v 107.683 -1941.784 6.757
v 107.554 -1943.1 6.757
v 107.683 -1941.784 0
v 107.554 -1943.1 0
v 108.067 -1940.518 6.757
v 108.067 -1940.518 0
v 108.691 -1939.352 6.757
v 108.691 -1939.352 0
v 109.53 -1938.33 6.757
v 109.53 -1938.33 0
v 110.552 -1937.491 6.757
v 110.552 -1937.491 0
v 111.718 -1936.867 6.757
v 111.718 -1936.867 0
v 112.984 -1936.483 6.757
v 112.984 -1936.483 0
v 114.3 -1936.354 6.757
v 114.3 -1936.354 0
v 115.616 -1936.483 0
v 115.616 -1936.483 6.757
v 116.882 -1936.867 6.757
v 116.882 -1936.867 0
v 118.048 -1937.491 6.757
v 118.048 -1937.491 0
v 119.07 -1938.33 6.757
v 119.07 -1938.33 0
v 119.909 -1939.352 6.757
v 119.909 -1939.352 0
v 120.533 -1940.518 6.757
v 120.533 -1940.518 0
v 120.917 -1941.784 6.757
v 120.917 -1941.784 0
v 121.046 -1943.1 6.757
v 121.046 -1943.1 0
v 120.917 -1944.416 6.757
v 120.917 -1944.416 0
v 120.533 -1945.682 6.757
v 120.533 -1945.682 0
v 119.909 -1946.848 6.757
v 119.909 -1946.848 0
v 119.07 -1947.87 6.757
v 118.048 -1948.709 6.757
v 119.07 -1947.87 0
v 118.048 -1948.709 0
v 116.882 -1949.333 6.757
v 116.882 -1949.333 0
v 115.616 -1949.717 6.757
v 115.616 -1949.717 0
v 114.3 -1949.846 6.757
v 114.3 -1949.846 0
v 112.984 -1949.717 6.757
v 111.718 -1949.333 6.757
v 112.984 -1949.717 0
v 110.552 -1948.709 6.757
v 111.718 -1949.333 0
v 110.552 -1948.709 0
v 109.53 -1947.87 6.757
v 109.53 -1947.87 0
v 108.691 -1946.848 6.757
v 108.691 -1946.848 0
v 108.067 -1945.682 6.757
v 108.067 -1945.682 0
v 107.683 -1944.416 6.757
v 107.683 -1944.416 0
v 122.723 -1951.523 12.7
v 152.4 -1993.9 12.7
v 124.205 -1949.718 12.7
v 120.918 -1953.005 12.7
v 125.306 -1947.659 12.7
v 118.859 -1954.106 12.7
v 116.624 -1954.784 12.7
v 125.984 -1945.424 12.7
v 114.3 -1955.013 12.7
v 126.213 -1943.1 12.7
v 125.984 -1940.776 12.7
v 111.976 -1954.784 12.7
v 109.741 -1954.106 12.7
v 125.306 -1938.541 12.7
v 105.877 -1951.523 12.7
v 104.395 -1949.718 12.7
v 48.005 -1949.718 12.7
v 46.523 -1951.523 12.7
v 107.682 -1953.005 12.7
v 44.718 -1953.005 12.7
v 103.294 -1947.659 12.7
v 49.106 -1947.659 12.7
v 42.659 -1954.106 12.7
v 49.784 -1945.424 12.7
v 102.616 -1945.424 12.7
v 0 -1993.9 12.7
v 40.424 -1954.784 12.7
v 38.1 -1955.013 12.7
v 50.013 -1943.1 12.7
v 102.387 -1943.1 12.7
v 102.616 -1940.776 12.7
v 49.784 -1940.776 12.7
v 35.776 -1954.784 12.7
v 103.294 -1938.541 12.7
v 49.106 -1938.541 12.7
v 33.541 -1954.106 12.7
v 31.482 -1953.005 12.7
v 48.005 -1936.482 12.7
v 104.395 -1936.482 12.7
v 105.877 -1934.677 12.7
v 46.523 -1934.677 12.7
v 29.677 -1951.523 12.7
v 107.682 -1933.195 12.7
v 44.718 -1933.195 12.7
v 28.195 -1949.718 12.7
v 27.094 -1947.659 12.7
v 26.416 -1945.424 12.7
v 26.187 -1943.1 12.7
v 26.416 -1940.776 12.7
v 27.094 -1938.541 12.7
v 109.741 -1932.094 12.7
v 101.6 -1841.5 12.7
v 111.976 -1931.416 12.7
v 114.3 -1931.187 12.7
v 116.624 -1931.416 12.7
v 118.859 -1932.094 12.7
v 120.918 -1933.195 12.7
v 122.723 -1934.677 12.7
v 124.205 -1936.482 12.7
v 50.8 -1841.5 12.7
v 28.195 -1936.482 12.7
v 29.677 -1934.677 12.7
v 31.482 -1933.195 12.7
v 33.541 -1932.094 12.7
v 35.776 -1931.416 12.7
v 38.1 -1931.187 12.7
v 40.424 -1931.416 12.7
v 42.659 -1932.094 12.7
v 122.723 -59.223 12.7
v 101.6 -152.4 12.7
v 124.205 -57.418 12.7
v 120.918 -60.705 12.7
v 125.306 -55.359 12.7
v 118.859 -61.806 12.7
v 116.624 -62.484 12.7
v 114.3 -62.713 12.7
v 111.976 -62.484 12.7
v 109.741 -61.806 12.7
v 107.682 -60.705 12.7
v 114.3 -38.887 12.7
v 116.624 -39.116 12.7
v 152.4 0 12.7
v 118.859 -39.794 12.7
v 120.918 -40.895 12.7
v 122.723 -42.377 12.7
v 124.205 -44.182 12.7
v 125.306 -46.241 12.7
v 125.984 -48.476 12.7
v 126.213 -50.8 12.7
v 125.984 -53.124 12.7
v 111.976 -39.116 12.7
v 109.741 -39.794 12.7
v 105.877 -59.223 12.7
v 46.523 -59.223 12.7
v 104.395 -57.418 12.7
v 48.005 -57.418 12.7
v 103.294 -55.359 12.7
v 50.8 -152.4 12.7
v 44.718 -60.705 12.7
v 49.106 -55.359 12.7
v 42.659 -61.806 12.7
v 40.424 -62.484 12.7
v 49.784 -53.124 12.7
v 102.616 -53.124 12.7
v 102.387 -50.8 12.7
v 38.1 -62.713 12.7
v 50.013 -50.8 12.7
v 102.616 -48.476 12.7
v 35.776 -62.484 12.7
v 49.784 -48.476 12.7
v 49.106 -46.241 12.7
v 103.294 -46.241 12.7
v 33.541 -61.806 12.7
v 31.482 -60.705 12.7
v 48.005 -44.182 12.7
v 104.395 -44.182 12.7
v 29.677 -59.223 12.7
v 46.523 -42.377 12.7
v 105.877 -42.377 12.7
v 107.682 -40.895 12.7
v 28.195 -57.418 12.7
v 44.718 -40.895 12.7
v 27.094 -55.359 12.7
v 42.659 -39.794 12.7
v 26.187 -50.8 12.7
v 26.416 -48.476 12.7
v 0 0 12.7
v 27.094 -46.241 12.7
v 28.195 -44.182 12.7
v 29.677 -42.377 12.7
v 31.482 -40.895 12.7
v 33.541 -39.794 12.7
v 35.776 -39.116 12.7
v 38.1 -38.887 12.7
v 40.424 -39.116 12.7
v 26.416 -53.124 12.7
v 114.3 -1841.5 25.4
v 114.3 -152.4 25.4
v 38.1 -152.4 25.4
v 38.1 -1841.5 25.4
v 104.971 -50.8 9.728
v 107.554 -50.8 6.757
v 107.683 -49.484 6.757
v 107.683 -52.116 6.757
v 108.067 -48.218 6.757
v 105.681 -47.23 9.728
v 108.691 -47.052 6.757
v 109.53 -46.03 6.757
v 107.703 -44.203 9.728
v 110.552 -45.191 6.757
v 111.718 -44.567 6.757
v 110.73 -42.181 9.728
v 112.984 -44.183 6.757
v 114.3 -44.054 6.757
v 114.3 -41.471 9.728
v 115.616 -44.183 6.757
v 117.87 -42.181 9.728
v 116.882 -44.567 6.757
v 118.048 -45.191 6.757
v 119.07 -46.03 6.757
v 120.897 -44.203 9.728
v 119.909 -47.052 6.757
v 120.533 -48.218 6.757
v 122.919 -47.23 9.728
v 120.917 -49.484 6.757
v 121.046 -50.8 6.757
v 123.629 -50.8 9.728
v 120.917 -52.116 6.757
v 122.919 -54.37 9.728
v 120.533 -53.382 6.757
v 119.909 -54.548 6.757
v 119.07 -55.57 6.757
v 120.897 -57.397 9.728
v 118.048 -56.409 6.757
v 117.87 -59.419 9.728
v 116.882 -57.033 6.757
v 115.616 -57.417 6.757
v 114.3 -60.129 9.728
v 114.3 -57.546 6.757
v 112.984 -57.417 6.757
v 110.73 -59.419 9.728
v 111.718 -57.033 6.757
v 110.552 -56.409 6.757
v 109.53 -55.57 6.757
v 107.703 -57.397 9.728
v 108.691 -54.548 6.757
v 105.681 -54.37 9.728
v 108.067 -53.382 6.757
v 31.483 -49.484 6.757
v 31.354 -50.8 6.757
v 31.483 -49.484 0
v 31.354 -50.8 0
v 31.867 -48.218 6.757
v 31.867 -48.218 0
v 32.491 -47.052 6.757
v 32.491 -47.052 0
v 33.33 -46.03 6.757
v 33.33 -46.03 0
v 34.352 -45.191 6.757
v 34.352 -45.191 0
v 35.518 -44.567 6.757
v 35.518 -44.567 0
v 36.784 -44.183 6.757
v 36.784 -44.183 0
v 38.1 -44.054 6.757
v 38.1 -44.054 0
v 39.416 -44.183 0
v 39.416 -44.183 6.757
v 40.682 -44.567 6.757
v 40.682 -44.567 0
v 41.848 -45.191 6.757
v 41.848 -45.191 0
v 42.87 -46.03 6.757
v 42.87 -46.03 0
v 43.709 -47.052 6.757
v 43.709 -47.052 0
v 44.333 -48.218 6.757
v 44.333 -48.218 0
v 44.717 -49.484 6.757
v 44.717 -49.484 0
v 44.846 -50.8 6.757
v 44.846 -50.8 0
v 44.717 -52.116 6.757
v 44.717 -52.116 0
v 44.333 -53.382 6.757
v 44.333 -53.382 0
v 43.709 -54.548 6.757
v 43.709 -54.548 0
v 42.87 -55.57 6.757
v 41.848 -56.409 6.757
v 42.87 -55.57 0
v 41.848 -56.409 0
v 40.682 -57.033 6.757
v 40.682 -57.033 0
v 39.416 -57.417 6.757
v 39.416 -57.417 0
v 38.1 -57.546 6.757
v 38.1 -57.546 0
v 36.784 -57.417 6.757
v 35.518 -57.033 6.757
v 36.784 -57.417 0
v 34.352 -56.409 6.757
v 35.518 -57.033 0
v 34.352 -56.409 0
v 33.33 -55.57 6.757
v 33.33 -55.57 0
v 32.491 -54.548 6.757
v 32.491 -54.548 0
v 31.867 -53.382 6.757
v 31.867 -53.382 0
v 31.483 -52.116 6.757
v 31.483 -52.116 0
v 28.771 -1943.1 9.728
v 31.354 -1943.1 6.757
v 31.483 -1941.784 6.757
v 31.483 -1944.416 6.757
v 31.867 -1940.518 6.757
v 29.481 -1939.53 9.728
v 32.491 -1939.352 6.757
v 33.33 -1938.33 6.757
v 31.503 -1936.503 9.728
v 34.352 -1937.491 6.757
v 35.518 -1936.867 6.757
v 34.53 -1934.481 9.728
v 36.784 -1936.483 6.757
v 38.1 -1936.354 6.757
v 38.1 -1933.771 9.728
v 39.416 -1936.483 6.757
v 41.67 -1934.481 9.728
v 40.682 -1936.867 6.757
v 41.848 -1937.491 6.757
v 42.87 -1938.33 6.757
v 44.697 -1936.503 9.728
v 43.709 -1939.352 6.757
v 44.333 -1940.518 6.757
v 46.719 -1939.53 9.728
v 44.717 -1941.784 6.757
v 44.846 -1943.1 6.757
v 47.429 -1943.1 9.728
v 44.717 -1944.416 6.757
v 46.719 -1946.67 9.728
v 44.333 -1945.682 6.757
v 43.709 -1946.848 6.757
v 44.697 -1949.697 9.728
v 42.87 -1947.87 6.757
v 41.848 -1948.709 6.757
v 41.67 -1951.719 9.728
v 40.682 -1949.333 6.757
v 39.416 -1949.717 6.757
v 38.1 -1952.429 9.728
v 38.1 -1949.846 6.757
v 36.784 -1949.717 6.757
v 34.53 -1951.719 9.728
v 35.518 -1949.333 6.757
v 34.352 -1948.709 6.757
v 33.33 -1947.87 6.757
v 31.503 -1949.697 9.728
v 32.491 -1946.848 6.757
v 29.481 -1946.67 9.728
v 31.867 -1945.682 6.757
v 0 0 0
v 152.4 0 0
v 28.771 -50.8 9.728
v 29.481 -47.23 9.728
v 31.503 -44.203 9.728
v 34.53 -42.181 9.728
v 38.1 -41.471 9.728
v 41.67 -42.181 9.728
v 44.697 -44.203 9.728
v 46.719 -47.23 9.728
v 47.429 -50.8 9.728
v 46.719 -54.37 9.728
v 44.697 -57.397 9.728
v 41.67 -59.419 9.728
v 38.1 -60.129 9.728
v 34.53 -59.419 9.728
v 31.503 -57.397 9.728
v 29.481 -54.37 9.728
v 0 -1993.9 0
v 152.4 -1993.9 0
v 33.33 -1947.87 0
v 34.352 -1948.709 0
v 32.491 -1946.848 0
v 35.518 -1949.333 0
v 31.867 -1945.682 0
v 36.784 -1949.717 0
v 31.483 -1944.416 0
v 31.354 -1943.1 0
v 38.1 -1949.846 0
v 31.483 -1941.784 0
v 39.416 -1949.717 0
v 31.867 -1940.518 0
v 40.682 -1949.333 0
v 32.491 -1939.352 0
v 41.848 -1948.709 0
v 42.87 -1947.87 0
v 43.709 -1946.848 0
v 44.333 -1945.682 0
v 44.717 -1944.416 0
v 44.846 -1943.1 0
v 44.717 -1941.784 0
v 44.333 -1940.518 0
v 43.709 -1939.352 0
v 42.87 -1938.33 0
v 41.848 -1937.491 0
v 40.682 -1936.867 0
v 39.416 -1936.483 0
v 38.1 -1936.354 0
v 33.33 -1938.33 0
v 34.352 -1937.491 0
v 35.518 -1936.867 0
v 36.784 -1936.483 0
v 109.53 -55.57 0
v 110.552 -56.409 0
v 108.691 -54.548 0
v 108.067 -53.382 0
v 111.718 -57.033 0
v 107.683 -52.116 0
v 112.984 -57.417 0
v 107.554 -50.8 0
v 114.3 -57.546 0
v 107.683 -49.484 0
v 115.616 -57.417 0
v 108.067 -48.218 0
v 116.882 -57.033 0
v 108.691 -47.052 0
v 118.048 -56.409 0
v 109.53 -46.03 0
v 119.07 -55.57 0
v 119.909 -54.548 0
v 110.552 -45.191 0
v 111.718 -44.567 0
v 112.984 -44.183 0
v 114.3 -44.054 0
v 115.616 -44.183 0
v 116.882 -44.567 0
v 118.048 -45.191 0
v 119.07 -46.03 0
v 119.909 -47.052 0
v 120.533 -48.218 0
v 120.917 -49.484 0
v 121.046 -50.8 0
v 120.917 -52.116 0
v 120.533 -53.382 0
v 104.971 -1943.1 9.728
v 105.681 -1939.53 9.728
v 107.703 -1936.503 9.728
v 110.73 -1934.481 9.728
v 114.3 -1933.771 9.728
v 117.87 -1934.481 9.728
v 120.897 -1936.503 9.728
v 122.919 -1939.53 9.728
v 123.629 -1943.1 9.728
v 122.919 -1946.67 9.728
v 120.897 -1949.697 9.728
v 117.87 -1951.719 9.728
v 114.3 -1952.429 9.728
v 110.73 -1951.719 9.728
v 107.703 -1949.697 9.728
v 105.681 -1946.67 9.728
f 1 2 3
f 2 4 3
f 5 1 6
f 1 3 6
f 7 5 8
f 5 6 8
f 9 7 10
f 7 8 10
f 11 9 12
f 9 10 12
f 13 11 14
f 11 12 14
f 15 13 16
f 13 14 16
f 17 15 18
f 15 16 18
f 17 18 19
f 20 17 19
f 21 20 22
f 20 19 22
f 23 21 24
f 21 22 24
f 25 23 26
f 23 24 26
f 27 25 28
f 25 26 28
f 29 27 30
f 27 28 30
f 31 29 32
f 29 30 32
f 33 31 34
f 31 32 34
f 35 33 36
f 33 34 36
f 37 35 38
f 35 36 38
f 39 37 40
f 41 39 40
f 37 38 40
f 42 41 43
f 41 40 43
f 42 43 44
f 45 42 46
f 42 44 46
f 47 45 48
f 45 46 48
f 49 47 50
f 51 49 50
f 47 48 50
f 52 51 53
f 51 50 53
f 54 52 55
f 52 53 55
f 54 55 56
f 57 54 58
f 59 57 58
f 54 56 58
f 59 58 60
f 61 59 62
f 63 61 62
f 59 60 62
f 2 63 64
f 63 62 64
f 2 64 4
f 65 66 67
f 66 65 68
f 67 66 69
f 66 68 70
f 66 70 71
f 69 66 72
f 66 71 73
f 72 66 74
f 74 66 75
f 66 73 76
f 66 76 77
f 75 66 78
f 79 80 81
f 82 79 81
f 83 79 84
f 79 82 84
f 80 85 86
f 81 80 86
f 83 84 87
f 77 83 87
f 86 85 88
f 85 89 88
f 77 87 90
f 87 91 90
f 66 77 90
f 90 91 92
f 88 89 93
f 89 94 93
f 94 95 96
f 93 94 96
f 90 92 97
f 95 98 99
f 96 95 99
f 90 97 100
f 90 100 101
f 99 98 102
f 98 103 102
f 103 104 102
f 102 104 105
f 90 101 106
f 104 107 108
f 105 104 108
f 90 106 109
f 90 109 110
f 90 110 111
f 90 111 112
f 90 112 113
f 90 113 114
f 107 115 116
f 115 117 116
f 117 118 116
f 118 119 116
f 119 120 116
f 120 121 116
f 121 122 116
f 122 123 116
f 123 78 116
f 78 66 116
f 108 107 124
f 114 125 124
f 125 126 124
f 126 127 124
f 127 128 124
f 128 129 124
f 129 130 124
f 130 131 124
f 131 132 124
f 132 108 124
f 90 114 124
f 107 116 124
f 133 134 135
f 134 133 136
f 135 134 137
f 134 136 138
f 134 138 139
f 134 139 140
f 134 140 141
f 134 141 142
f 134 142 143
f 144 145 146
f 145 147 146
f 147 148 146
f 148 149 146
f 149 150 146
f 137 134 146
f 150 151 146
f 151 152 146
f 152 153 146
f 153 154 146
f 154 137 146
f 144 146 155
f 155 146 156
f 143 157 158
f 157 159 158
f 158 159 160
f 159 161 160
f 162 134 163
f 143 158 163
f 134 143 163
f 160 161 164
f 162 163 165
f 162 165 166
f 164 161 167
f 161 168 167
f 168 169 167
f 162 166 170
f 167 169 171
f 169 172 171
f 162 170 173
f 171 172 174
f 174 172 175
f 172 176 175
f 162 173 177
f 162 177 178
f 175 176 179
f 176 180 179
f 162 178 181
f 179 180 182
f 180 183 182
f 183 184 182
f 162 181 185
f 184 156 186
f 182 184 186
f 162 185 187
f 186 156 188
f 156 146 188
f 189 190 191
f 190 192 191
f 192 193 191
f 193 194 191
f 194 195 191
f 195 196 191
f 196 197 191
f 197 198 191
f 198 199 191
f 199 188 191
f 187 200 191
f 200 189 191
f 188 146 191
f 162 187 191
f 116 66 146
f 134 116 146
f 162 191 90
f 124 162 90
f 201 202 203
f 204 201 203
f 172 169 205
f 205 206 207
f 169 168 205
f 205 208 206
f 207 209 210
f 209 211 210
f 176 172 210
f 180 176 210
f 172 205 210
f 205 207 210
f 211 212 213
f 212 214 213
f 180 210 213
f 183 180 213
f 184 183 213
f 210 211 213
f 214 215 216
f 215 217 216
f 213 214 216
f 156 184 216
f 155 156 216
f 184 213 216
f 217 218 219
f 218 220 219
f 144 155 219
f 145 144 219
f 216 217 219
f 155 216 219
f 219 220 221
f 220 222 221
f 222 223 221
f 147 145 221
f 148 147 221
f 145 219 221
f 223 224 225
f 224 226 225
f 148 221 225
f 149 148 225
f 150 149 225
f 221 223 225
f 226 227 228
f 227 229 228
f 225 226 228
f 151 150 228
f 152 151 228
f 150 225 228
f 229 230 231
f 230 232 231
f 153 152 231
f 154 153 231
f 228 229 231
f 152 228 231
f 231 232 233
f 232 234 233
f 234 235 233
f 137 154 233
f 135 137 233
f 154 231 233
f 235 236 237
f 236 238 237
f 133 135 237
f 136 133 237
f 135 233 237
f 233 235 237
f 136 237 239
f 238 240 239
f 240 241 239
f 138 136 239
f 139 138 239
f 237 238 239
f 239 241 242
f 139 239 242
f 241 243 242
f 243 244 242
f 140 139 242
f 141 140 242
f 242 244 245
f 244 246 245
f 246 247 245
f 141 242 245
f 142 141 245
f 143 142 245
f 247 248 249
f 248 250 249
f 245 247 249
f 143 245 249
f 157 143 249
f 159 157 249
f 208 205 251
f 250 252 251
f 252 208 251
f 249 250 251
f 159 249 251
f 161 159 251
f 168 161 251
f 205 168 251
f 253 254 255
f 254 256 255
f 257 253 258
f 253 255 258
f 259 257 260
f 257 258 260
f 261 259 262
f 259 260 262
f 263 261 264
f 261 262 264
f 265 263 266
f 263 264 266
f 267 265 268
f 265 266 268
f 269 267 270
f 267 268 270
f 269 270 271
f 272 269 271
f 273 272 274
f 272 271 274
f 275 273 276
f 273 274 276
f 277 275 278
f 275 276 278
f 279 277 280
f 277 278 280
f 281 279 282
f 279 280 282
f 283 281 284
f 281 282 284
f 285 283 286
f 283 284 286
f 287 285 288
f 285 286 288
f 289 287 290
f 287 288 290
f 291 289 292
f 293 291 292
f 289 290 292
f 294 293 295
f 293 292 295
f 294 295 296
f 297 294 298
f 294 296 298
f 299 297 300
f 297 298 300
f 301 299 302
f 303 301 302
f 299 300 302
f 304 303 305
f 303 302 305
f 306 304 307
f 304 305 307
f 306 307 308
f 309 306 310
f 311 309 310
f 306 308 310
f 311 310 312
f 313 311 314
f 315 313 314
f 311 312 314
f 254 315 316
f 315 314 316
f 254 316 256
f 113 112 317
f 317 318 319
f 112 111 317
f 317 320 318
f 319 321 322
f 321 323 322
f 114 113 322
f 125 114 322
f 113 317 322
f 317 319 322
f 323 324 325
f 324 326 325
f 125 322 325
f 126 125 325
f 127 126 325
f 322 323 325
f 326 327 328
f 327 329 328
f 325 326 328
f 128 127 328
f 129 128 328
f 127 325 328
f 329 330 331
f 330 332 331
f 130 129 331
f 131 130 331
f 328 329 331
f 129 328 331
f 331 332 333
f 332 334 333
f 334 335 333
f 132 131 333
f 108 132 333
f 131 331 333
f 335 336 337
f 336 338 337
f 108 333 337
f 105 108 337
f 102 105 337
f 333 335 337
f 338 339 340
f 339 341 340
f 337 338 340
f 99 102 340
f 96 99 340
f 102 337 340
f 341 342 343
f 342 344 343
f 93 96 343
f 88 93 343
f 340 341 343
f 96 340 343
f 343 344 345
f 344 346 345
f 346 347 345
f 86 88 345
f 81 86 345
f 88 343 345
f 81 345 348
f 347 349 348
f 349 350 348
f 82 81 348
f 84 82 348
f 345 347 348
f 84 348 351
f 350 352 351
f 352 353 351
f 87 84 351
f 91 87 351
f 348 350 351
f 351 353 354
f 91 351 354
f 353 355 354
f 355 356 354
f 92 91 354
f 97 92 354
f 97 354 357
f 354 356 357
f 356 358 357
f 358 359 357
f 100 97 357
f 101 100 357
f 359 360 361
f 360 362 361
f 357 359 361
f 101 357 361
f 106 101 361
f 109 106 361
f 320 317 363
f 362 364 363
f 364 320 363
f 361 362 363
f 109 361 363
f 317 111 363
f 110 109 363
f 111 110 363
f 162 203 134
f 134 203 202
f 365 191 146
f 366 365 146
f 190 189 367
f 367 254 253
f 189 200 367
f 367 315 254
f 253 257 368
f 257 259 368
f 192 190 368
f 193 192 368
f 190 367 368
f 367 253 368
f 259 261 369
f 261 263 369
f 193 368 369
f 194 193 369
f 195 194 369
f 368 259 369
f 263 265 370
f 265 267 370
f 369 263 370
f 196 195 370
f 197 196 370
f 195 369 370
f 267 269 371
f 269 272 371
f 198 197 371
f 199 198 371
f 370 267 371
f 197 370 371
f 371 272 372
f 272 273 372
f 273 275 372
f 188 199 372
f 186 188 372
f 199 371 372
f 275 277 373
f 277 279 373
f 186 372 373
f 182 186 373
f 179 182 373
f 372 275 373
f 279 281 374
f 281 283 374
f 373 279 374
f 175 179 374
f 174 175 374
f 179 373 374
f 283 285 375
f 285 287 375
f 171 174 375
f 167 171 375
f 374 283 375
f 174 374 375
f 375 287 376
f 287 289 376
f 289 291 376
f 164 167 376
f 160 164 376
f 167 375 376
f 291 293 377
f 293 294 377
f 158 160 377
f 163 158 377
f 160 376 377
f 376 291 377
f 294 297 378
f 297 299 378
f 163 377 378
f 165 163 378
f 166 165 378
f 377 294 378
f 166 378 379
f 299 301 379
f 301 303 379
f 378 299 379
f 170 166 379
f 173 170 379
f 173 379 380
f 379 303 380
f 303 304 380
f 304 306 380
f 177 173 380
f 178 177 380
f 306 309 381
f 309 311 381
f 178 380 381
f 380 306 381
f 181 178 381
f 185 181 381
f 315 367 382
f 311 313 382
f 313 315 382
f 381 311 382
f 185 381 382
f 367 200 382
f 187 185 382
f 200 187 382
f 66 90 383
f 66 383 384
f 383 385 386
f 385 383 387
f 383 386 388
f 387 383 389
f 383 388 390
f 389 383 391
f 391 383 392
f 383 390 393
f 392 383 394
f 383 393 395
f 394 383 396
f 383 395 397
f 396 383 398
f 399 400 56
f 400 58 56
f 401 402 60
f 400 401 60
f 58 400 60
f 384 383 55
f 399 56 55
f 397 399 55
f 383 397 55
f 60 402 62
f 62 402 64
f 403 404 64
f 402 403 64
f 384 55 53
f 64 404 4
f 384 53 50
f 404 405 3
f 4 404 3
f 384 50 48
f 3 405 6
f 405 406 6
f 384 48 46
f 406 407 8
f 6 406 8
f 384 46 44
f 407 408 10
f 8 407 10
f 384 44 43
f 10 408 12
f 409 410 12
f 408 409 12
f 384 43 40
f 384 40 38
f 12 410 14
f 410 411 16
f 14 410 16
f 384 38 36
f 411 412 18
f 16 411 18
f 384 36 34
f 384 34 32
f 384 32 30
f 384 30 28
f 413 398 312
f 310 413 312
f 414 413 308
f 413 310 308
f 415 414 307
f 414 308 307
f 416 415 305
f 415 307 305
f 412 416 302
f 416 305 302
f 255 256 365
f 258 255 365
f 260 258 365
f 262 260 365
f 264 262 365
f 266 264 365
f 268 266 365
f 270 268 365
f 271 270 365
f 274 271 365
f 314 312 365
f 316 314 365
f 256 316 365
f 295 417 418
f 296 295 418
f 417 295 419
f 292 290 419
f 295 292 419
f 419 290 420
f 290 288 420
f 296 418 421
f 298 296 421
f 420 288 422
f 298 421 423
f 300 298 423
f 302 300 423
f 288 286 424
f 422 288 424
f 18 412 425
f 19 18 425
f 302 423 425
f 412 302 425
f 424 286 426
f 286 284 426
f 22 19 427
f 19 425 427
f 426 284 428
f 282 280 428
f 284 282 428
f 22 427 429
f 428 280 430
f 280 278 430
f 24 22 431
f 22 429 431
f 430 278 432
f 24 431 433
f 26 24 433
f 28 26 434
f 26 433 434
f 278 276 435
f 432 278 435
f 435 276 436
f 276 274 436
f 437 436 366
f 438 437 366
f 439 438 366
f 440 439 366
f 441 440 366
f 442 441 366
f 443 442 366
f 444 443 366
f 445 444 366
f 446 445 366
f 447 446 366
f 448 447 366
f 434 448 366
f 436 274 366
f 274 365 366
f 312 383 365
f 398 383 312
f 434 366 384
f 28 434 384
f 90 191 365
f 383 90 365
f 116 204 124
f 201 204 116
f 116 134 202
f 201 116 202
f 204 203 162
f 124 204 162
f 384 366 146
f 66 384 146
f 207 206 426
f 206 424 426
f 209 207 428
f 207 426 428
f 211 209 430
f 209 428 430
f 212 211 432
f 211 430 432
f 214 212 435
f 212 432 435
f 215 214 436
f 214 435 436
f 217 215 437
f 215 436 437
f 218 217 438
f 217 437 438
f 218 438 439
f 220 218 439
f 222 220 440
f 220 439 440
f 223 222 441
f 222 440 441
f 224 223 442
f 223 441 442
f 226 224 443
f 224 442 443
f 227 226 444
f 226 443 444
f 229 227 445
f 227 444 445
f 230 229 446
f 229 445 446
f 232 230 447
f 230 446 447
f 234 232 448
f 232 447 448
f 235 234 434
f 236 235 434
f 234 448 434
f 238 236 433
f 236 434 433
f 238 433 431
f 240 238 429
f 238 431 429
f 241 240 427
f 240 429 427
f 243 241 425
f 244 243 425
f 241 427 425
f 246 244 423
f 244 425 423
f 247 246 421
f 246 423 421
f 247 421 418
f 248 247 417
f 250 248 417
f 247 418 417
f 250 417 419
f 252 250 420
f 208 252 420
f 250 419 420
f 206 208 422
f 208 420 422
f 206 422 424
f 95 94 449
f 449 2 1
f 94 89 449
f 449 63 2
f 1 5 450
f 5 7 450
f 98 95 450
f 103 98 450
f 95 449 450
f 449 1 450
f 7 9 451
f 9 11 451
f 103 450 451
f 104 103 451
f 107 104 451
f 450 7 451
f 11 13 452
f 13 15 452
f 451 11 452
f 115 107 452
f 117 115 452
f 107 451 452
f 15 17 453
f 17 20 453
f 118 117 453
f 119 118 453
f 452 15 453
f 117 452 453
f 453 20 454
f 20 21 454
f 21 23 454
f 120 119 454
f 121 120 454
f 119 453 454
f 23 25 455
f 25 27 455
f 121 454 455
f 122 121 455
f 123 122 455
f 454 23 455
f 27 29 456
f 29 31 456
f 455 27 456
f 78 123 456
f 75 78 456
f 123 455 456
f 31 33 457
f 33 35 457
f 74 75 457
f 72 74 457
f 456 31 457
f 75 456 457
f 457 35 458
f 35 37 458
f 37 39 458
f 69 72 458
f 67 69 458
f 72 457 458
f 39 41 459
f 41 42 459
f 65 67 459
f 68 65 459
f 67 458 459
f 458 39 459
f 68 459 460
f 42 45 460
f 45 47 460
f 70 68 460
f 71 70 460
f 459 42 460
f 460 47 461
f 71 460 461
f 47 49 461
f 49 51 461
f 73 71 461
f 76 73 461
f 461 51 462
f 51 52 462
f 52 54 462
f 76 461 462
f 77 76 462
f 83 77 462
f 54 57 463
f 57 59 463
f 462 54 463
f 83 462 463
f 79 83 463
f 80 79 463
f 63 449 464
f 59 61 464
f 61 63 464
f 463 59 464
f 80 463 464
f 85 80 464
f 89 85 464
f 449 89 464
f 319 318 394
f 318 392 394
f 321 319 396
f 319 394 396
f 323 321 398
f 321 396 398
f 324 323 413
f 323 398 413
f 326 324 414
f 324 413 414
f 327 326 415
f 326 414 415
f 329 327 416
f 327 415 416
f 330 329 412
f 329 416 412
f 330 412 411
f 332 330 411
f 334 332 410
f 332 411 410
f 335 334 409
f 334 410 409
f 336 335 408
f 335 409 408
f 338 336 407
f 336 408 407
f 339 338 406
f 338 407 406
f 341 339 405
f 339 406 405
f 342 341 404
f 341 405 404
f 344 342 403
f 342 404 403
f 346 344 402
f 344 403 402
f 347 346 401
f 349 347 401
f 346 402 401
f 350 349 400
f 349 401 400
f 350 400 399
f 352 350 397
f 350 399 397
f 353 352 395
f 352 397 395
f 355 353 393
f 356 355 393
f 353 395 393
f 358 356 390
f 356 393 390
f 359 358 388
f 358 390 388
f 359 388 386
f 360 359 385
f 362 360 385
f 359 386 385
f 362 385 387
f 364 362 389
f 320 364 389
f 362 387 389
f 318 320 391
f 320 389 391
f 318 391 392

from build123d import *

# Parameters (mm, degrees)
F1_DEPTH       = 1993.9
F2_W           = 152.4
F2_H           = 152.4
F3_DEPTH       = 12.7
F5_D           = 13.49248
F5_CSINK_D     = 23.8252
F5_CSINK_ANGLE = 82


with BuildPart() as f1:
    # F0 (on Front) → F1 (new body)
    with BuildSketch(Plane.XZ):
        Polygon((0, 12.7), (0, 0), (152.4, 0), (152.4, 12.7), (101.6, 12.7), (114.3, 25.4), (38.1, 25.4), (50.8, 12.7), align=None)
    extrude(amount=F1_DEPTH)

    # F2 (on face) → F3 (cut, through all)
    with BuildSketch(Plane.XY.offset(25.4)):
        with Locations((76.2, -76.2)):
            Rectangle(F2_W, F2_H)
        with Locations((76.2, -1917.7)):
            Rectangle(F2_W, F2_H)
    extrude(amount=-F3_DEPTH, mode=Mode.SUBTRACT)

    # F5 (through all)
    with Locations(Plane.XY.offset(12.7)):
        with Locations((38.1, -50.8), (114.3, -50.8), (38.1, -1943.1), (114.3, -1943.1)):
            CounterSinkHole(F5_D / 2, F5_CSINK_D / 2, counter_sink_angle=F5_CSINK_ANGLE)


solid = f1.part
